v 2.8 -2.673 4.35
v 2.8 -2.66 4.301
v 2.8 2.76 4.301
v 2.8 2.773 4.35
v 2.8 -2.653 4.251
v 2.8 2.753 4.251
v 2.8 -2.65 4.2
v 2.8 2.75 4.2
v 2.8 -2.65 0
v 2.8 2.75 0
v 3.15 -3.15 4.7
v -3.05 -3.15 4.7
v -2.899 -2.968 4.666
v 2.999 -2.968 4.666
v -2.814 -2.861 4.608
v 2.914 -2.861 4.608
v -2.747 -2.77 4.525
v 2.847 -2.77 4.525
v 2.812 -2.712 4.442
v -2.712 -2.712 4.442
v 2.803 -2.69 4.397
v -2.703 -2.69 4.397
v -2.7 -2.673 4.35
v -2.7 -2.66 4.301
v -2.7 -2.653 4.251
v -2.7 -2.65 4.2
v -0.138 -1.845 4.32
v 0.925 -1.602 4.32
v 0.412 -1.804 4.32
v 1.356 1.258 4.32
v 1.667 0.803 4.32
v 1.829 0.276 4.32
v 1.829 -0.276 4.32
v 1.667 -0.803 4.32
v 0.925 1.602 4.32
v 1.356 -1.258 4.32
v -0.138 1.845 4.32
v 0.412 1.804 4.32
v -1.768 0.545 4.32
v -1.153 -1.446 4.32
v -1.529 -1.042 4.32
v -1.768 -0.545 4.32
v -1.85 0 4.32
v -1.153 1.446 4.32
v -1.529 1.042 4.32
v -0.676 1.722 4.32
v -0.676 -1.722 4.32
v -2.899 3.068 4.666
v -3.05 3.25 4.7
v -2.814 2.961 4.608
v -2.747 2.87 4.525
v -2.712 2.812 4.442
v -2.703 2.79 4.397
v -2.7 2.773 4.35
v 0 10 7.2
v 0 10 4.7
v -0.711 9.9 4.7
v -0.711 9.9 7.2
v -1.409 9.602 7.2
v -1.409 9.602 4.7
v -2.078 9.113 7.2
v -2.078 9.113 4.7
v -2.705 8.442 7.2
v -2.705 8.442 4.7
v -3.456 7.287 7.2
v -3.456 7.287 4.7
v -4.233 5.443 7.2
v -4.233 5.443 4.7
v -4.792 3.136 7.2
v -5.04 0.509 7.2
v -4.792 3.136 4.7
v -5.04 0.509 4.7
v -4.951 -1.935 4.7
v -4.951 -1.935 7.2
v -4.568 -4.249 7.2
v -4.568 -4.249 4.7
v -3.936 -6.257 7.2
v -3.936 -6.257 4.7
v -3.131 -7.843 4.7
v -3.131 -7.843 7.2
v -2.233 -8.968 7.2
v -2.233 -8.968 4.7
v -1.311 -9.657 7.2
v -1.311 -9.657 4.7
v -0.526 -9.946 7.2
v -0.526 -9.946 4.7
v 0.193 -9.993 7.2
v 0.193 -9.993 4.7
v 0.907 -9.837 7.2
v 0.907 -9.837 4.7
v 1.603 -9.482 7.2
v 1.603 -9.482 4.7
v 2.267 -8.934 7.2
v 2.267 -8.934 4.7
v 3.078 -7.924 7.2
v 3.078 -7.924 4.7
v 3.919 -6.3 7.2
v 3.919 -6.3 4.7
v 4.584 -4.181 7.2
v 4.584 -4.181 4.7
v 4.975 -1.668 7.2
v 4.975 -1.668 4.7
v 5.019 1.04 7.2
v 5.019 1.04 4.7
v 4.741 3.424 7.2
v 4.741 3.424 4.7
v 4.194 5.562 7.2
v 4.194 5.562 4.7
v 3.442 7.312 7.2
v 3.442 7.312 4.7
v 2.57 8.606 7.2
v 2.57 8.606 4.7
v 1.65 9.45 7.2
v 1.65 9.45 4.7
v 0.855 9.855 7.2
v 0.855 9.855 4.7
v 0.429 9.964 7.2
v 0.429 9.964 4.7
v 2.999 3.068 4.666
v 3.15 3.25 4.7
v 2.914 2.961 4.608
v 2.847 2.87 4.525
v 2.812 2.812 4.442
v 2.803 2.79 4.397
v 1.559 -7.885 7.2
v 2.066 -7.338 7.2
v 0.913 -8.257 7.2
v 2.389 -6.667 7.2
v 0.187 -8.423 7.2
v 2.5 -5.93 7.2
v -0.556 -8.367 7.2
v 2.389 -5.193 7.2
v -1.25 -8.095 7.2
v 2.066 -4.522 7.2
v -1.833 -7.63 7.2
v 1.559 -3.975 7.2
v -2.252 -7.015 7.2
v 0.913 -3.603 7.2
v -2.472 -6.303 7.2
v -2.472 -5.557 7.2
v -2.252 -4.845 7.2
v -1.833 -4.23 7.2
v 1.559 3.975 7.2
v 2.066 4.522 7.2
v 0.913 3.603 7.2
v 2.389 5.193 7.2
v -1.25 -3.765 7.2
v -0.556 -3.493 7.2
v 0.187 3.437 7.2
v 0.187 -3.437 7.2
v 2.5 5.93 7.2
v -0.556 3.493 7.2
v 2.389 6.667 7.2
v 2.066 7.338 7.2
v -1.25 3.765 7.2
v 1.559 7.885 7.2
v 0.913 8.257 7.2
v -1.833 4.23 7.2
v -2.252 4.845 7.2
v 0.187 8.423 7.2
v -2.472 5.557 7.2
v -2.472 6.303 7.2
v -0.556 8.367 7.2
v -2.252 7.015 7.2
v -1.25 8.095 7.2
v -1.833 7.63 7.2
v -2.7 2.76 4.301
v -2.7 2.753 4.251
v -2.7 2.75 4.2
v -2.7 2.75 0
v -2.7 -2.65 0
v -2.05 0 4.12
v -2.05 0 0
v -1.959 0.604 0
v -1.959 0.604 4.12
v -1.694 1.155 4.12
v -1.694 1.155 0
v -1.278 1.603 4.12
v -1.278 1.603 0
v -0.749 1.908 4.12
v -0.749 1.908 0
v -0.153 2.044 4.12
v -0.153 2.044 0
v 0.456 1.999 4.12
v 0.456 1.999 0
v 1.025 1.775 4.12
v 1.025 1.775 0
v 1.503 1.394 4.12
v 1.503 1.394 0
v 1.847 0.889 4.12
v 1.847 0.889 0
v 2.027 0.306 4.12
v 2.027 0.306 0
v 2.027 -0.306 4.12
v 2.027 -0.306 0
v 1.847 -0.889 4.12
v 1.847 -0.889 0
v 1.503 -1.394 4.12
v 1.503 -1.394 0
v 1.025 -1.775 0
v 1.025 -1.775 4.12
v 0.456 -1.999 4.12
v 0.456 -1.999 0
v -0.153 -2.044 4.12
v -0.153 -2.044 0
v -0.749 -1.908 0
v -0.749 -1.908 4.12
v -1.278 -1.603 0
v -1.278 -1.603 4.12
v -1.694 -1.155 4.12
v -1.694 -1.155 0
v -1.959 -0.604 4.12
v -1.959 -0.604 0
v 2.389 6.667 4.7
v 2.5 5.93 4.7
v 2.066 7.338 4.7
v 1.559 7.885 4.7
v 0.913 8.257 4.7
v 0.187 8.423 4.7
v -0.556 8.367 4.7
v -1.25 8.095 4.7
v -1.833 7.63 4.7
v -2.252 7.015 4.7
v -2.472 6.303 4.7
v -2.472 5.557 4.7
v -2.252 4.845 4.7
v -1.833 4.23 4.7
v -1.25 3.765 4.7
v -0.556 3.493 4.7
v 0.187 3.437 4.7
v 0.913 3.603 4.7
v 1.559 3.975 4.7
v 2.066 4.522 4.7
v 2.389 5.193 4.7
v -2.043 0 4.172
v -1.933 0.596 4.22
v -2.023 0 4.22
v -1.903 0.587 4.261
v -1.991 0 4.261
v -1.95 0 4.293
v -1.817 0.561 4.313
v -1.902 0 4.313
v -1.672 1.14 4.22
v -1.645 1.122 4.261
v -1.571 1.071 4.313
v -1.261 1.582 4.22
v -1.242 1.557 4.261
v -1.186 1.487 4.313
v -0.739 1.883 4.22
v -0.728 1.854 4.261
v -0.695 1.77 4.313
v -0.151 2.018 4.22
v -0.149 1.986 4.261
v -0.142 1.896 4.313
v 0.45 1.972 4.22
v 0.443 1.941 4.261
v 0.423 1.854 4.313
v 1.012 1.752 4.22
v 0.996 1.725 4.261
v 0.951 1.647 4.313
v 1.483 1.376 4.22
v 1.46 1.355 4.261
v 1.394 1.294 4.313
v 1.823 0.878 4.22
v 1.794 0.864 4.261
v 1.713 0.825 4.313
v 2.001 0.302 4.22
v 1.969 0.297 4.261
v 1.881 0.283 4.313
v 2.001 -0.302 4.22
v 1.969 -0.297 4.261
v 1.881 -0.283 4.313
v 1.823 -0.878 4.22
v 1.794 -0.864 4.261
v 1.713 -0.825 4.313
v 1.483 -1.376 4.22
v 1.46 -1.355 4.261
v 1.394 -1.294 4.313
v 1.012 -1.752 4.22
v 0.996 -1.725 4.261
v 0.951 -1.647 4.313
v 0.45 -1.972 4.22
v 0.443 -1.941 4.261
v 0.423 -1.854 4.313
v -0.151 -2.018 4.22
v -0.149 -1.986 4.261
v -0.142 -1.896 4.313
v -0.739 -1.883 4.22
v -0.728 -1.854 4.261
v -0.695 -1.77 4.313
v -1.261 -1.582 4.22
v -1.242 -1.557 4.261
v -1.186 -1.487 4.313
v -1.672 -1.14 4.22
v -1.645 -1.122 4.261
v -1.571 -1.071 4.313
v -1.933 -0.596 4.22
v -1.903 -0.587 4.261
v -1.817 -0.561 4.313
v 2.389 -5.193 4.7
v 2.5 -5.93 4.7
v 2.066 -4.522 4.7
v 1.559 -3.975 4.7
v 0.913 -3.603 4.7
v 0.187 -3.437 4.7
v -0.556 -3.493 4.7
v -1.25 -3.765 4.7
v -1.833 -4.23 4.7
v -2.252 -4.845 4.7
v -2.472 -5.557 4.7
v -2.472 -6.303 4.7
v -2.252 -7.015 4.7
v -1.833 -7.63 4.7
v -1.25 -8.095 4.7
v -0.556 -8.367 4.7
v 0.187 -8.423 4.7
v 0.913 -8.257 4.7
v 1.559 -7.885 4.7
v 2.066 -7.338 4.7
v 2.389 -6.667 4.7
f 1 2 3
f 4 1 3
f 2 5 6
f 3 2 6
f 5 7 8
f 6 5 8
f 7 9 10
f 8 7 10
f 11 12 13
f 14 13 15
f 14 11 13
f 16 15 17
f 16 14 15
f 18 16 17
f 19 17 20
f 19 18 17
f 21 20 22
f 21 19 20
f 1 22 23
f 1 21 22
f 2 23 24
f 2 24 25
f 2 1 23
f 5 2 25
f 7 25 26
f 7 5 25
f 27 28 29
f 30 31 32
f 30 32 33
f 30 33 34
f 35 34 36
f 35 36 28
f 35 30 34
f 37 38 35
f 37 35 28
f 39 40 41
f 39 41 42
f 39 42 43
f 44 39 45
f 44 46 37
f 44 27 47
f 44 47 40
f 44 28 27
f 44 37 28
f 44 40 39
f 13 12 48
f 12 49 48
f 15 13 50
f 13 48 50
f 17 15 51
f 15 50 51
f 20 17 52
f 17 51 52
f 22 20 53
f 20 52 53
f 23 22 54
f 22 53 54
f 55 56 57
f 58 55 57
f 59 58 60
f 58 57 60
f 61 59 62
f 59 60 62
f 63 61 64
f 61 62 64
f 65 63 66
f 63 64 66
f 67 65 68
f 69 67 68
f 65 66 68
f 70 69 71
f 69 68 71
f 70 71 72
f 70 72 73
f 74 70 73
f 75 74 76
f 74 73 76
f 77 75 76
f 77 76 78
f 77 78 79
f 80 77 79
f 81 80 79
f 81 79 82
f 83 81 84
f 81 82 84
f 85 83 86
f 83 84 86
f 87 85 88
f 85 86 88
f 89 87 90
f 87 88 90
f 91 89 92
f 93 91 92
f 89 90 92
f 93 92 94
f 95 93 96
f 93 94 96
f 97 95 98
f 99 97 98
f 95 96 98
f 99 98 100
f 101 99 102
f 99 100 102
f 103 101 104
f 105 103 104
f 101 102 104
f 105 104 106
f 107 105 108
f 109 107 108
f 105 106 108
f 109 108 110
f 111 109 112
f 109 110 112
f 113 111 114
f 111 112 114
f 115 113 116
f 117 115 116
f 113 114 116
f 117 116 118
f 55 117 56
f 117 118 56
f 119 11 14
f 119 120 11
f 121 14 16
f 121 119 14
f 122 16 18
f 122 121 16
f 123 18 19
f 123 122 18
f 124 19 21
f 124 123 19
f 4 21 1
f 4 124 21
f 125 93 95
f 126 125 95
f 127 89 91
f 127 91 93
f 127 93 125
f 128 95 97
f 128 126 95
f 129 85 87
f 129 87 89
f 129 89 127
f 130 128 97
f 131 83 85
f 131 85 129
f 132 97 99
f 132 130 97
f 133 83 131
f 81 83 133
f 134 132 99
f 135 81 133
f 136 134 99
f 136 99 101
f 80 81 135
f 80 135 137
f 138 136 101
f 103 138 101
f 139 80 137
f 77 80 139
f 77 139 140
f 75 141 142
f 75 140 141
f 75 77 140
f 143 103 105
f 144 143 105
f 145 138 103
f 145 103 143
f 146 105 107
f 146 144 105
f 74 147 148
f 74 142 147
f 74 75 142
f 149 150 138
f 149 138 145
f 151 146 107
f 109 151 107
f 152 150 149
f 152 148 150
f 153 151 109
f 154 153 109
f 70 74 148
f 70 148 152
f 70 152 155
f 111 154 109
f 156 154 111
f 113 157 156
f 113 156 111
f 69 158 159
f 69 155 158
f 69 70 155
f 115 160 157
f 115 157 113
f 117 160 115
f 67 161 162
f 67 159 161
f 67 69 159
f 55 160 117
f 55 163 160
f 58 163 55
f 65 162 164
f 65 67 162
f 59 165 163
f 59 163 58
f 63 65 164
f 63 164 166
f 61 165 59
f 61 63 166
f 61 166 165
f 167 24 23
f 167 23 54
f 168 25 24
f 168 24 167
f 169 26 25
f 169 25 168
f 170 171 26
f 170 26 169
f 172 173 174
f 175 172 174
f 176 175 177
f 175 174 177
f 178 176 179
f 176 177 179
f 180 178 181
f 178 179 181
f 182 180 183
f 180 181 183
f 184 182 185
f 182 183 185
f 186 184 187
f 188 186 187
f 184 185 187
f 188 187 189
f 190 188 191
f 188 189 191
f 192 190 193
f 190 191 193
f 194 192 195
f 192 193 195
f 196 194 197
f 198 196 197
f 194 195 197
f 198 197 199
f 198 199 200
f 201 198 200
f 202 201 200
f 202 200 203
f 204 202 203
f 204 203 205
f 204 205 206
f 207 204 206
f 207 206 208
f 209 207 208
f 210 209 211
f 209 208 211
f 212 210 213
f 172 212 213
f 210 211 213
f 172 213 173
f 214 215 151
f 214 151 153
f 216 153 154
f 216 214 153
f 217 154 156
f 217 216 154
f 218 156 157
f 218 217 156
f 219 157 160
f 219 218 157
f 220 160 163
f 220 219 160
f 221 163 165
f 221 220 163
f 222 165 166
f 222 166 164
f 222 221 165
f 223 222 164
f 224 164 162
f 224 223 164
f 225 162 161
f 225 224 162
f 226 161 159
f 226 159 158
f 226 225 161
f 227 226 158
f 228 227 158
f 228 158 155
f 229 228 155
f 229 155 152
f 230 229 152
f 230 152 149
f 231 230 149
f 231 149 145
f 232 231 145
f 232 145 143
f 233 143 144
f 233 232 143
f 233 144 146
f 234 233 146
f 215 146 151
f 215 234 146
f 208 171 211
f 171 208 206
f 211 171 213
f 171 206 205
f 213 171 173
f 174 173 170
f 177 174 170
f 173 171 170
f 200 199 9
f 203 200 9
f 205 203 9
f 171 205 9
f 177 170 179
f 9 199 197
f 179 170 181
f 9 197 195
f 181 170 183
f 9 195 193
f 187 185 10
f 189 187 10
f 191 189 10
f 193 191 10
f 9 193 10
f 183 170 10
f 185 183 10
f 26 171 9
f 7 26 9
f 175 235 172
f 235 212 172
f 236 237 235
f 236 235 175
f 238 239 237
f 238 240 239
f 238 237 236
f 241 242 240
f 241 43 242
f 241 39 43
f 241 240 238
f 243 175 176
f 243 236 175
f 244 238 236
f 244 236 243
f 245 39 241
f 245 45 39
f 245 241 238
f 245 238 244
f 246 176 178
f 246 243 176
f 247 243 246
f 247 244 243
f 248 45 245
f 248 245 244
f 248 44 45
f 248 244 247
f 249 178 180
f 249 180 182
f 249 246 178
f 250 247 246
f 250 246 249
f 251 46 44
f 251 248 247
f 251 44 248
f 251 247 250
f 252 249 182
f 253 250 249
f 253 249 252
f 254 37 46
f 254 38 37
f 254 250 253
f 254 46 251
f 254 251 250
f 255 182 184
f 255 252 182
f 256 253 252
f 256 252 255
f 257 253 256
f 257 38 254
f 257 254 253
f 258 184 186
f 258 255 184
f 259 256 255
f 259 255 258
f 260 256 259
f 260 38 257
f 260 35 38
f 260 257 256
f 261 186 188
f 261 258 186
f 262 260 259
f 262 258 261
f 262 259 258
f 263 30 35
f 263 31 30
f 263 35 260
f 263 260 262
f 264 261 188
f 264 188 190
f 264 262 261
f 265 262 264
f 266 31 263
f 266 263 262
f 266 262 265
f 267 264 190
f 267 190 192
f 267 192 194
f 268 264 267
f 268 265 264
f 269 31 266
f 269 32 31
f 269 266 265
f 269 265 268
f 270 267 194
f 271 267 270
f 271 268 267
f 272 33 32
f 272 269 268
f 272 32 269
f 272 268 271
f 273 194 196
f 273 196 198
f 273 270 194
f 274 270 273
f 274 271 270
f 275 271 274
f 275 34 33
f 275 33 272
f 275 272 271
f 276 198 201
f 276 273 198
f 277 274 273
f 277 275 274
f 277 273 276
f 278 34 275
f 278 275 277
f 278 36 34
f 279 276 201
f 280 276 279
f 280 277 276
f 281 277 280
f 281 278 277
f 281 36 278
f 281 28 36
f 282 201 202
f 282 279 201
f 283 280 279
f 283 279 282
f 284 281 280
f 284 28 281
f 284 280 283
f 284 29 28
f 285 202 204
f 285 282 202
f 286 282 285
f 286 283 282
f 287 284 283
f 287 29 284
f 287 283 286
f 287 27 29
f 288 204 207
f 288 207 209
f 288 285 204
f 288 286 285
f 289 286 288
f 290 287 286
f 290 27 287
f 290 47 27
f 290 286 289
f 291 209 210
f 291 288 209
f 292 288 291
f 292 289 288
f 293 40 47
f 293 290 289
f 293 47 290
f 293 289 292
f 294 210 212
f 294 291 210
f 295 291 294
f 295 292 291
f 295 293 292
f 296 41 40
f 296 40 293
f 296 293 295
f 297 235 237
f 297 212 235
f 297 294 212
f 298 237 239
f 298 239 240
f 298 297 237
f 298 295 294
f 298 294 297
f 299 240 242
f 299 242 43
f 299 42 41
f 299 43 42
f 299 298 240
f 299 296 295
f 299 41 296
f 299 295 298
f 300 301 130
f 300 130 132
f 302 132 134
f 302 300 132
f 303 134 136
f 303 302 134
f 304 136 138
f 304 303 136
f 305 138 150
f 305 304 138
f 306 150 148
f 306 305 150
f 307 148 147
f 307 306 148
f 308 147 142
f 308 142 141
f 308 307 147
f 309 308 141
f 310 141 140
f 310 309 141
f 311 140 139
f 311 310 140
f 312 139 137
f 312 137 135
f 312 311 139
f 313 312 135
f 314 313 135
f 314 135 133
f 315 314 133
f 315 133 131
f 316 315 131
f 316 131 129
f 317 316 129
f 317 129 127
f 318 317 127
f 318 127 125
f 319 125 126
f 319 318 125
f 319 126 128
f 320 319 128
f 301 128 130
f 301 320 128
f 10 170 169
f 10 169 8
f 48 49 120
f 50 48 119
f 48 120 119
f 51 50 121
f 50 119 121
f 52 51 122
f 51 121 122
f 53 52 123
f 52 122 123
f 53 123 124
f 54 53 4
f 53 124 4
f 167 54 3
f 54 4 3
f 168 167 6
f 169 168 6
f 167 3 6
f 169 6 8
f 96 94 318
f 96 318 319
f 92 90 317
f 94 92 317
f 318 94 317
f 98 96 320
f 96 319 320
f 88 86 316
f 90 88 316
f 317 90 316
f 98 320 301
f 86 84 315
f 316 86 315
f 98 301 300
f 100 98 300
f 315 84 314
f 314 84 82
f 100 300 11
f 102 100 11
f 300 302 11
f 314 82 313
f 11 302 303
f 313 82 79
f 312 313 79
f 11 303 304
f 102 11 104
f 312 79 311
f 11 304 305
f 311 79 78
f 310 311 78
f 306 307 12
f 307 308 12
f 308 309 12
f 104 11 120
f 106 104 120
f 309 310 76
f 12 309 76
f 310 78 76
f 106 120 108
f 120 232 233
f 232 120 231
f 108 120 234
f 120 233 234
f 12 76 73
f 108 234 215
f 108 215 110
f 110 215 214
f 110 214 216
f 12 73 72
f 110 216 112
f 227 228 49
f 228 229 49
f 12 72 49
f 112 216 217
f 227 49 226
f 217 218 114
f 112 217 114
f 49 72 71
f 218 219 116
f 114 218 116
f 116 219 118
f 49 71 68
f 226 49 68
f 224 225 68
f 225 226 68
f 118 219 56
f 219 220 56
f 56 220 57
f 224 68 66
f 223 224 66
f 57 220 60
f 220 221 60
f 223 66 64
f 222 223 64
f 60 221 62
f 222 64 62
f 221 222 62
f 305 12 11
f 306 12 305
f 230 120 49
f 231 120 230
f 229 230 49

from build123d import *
from OCP.BRepFilletAPI import BRepFilletAPI_MakeFillet

# Parameters (mm, degrees)
ESQUISSE4_W             = 5.5
ESQUISSE4_H             = 5.4
BOSS_EXTRU_2_DEPTH      = 4.7
ESQUISSE5_RX            = 10
ESQUISSE5_RY            = 5.046155586
ESQUISSE5_R             = 2.5
BOSS_EXTRU_4_DEPTH      = 2.5
ESQUISSE6_R             = 2.05
ENL_V_MAT_EXTRU_1_DEPTH = 4.32
CONG_1_R1               = 0.2
CONG_1_R2               = 0.35
CONG_1_R3               = 0.5


with BuildPart() as part:
    # Esquisse4 → Boss.-Extru.2 (new body)
    with BuildSketch(Plane.XY):
        with Locations((0.05, 0.05)):
            Rectangle(ESQUISSE4_W, ESQUISSE4_H)
    extrude(amount=BOSS_EXTRU_2_DEPTH)

    # Esquisse5 → Boss.-Extru.4 (add)
    with BuildSketch(Plane.XY.offset(4.7)):
        with Locations(Location((0, 0), (0, 0, 90))):
            Ellipse(ESQUISSE5_RX, ESQUISSE5_RY)
        with Locations((0, 5.93)):
            Circle(ESQUISSE5_R, mode=Mode.SUBTRACT)
        with Locations((0, -5.93)):
            Circle(ESQUISSE5_R, mode=Mode.SUBTRACT)
    extrude(amount=BOSS_EXTRU_4_DEPTH)

    # Esquisse6 → Enlèv. mat.-Extru.1 (cut)
    with BuildSketch(Plane(origin=(0, 0, 0), x_dir=(-1, 0, 0), z_dir=(0, 0, -1))):
        Circle(ESQUISSE6_R)
    extrude(amount=-ENL_V_MAT_EXTRU_1_DEPTH, mode=Mode.SUBTRACT)

    # Congé1: one fillet with a radius per group of edges: ONE call of the kernel's fillet builder (fillet() takes one radius for all edges)
    cong_1_edges_1 = [part.edges().sort_by_distance(p)[0] for p in [
        (2.05, 0, 4.32),
    ]]
    cong_1_edges_2 = [part.edges().sort_by_distance(p)[0] for p in [
        (2.8, 0.05, 4.7),
        (-2.7, 0.05, 4.7),
    ]]
    cong_1_edges_3 = [part.edges().sort_by_distance(p)[0] for p in [
        (0.05, 2.75, 4.7),
        (0.05, -2.65, 4.7),
    ]]
    cong_1 = BRepFilletAPI_MakeFillet(part.part.solid().wrapped)
    for e in cong_1_edges_1:
        cong_1.Add(CONG_1_R1, e.wrapped)
    for e in cong_1_edges_2:
        cong_1.Add(CONG_1_R2, e.wrapped)
    for e in cong_1_edges_3:
        cong_1.Add(CONG_1_R3, e.wrapped)
    add(Compound.cast(cong_1.Shape()), mode=Mode.REPLACE)


solid = part.part
